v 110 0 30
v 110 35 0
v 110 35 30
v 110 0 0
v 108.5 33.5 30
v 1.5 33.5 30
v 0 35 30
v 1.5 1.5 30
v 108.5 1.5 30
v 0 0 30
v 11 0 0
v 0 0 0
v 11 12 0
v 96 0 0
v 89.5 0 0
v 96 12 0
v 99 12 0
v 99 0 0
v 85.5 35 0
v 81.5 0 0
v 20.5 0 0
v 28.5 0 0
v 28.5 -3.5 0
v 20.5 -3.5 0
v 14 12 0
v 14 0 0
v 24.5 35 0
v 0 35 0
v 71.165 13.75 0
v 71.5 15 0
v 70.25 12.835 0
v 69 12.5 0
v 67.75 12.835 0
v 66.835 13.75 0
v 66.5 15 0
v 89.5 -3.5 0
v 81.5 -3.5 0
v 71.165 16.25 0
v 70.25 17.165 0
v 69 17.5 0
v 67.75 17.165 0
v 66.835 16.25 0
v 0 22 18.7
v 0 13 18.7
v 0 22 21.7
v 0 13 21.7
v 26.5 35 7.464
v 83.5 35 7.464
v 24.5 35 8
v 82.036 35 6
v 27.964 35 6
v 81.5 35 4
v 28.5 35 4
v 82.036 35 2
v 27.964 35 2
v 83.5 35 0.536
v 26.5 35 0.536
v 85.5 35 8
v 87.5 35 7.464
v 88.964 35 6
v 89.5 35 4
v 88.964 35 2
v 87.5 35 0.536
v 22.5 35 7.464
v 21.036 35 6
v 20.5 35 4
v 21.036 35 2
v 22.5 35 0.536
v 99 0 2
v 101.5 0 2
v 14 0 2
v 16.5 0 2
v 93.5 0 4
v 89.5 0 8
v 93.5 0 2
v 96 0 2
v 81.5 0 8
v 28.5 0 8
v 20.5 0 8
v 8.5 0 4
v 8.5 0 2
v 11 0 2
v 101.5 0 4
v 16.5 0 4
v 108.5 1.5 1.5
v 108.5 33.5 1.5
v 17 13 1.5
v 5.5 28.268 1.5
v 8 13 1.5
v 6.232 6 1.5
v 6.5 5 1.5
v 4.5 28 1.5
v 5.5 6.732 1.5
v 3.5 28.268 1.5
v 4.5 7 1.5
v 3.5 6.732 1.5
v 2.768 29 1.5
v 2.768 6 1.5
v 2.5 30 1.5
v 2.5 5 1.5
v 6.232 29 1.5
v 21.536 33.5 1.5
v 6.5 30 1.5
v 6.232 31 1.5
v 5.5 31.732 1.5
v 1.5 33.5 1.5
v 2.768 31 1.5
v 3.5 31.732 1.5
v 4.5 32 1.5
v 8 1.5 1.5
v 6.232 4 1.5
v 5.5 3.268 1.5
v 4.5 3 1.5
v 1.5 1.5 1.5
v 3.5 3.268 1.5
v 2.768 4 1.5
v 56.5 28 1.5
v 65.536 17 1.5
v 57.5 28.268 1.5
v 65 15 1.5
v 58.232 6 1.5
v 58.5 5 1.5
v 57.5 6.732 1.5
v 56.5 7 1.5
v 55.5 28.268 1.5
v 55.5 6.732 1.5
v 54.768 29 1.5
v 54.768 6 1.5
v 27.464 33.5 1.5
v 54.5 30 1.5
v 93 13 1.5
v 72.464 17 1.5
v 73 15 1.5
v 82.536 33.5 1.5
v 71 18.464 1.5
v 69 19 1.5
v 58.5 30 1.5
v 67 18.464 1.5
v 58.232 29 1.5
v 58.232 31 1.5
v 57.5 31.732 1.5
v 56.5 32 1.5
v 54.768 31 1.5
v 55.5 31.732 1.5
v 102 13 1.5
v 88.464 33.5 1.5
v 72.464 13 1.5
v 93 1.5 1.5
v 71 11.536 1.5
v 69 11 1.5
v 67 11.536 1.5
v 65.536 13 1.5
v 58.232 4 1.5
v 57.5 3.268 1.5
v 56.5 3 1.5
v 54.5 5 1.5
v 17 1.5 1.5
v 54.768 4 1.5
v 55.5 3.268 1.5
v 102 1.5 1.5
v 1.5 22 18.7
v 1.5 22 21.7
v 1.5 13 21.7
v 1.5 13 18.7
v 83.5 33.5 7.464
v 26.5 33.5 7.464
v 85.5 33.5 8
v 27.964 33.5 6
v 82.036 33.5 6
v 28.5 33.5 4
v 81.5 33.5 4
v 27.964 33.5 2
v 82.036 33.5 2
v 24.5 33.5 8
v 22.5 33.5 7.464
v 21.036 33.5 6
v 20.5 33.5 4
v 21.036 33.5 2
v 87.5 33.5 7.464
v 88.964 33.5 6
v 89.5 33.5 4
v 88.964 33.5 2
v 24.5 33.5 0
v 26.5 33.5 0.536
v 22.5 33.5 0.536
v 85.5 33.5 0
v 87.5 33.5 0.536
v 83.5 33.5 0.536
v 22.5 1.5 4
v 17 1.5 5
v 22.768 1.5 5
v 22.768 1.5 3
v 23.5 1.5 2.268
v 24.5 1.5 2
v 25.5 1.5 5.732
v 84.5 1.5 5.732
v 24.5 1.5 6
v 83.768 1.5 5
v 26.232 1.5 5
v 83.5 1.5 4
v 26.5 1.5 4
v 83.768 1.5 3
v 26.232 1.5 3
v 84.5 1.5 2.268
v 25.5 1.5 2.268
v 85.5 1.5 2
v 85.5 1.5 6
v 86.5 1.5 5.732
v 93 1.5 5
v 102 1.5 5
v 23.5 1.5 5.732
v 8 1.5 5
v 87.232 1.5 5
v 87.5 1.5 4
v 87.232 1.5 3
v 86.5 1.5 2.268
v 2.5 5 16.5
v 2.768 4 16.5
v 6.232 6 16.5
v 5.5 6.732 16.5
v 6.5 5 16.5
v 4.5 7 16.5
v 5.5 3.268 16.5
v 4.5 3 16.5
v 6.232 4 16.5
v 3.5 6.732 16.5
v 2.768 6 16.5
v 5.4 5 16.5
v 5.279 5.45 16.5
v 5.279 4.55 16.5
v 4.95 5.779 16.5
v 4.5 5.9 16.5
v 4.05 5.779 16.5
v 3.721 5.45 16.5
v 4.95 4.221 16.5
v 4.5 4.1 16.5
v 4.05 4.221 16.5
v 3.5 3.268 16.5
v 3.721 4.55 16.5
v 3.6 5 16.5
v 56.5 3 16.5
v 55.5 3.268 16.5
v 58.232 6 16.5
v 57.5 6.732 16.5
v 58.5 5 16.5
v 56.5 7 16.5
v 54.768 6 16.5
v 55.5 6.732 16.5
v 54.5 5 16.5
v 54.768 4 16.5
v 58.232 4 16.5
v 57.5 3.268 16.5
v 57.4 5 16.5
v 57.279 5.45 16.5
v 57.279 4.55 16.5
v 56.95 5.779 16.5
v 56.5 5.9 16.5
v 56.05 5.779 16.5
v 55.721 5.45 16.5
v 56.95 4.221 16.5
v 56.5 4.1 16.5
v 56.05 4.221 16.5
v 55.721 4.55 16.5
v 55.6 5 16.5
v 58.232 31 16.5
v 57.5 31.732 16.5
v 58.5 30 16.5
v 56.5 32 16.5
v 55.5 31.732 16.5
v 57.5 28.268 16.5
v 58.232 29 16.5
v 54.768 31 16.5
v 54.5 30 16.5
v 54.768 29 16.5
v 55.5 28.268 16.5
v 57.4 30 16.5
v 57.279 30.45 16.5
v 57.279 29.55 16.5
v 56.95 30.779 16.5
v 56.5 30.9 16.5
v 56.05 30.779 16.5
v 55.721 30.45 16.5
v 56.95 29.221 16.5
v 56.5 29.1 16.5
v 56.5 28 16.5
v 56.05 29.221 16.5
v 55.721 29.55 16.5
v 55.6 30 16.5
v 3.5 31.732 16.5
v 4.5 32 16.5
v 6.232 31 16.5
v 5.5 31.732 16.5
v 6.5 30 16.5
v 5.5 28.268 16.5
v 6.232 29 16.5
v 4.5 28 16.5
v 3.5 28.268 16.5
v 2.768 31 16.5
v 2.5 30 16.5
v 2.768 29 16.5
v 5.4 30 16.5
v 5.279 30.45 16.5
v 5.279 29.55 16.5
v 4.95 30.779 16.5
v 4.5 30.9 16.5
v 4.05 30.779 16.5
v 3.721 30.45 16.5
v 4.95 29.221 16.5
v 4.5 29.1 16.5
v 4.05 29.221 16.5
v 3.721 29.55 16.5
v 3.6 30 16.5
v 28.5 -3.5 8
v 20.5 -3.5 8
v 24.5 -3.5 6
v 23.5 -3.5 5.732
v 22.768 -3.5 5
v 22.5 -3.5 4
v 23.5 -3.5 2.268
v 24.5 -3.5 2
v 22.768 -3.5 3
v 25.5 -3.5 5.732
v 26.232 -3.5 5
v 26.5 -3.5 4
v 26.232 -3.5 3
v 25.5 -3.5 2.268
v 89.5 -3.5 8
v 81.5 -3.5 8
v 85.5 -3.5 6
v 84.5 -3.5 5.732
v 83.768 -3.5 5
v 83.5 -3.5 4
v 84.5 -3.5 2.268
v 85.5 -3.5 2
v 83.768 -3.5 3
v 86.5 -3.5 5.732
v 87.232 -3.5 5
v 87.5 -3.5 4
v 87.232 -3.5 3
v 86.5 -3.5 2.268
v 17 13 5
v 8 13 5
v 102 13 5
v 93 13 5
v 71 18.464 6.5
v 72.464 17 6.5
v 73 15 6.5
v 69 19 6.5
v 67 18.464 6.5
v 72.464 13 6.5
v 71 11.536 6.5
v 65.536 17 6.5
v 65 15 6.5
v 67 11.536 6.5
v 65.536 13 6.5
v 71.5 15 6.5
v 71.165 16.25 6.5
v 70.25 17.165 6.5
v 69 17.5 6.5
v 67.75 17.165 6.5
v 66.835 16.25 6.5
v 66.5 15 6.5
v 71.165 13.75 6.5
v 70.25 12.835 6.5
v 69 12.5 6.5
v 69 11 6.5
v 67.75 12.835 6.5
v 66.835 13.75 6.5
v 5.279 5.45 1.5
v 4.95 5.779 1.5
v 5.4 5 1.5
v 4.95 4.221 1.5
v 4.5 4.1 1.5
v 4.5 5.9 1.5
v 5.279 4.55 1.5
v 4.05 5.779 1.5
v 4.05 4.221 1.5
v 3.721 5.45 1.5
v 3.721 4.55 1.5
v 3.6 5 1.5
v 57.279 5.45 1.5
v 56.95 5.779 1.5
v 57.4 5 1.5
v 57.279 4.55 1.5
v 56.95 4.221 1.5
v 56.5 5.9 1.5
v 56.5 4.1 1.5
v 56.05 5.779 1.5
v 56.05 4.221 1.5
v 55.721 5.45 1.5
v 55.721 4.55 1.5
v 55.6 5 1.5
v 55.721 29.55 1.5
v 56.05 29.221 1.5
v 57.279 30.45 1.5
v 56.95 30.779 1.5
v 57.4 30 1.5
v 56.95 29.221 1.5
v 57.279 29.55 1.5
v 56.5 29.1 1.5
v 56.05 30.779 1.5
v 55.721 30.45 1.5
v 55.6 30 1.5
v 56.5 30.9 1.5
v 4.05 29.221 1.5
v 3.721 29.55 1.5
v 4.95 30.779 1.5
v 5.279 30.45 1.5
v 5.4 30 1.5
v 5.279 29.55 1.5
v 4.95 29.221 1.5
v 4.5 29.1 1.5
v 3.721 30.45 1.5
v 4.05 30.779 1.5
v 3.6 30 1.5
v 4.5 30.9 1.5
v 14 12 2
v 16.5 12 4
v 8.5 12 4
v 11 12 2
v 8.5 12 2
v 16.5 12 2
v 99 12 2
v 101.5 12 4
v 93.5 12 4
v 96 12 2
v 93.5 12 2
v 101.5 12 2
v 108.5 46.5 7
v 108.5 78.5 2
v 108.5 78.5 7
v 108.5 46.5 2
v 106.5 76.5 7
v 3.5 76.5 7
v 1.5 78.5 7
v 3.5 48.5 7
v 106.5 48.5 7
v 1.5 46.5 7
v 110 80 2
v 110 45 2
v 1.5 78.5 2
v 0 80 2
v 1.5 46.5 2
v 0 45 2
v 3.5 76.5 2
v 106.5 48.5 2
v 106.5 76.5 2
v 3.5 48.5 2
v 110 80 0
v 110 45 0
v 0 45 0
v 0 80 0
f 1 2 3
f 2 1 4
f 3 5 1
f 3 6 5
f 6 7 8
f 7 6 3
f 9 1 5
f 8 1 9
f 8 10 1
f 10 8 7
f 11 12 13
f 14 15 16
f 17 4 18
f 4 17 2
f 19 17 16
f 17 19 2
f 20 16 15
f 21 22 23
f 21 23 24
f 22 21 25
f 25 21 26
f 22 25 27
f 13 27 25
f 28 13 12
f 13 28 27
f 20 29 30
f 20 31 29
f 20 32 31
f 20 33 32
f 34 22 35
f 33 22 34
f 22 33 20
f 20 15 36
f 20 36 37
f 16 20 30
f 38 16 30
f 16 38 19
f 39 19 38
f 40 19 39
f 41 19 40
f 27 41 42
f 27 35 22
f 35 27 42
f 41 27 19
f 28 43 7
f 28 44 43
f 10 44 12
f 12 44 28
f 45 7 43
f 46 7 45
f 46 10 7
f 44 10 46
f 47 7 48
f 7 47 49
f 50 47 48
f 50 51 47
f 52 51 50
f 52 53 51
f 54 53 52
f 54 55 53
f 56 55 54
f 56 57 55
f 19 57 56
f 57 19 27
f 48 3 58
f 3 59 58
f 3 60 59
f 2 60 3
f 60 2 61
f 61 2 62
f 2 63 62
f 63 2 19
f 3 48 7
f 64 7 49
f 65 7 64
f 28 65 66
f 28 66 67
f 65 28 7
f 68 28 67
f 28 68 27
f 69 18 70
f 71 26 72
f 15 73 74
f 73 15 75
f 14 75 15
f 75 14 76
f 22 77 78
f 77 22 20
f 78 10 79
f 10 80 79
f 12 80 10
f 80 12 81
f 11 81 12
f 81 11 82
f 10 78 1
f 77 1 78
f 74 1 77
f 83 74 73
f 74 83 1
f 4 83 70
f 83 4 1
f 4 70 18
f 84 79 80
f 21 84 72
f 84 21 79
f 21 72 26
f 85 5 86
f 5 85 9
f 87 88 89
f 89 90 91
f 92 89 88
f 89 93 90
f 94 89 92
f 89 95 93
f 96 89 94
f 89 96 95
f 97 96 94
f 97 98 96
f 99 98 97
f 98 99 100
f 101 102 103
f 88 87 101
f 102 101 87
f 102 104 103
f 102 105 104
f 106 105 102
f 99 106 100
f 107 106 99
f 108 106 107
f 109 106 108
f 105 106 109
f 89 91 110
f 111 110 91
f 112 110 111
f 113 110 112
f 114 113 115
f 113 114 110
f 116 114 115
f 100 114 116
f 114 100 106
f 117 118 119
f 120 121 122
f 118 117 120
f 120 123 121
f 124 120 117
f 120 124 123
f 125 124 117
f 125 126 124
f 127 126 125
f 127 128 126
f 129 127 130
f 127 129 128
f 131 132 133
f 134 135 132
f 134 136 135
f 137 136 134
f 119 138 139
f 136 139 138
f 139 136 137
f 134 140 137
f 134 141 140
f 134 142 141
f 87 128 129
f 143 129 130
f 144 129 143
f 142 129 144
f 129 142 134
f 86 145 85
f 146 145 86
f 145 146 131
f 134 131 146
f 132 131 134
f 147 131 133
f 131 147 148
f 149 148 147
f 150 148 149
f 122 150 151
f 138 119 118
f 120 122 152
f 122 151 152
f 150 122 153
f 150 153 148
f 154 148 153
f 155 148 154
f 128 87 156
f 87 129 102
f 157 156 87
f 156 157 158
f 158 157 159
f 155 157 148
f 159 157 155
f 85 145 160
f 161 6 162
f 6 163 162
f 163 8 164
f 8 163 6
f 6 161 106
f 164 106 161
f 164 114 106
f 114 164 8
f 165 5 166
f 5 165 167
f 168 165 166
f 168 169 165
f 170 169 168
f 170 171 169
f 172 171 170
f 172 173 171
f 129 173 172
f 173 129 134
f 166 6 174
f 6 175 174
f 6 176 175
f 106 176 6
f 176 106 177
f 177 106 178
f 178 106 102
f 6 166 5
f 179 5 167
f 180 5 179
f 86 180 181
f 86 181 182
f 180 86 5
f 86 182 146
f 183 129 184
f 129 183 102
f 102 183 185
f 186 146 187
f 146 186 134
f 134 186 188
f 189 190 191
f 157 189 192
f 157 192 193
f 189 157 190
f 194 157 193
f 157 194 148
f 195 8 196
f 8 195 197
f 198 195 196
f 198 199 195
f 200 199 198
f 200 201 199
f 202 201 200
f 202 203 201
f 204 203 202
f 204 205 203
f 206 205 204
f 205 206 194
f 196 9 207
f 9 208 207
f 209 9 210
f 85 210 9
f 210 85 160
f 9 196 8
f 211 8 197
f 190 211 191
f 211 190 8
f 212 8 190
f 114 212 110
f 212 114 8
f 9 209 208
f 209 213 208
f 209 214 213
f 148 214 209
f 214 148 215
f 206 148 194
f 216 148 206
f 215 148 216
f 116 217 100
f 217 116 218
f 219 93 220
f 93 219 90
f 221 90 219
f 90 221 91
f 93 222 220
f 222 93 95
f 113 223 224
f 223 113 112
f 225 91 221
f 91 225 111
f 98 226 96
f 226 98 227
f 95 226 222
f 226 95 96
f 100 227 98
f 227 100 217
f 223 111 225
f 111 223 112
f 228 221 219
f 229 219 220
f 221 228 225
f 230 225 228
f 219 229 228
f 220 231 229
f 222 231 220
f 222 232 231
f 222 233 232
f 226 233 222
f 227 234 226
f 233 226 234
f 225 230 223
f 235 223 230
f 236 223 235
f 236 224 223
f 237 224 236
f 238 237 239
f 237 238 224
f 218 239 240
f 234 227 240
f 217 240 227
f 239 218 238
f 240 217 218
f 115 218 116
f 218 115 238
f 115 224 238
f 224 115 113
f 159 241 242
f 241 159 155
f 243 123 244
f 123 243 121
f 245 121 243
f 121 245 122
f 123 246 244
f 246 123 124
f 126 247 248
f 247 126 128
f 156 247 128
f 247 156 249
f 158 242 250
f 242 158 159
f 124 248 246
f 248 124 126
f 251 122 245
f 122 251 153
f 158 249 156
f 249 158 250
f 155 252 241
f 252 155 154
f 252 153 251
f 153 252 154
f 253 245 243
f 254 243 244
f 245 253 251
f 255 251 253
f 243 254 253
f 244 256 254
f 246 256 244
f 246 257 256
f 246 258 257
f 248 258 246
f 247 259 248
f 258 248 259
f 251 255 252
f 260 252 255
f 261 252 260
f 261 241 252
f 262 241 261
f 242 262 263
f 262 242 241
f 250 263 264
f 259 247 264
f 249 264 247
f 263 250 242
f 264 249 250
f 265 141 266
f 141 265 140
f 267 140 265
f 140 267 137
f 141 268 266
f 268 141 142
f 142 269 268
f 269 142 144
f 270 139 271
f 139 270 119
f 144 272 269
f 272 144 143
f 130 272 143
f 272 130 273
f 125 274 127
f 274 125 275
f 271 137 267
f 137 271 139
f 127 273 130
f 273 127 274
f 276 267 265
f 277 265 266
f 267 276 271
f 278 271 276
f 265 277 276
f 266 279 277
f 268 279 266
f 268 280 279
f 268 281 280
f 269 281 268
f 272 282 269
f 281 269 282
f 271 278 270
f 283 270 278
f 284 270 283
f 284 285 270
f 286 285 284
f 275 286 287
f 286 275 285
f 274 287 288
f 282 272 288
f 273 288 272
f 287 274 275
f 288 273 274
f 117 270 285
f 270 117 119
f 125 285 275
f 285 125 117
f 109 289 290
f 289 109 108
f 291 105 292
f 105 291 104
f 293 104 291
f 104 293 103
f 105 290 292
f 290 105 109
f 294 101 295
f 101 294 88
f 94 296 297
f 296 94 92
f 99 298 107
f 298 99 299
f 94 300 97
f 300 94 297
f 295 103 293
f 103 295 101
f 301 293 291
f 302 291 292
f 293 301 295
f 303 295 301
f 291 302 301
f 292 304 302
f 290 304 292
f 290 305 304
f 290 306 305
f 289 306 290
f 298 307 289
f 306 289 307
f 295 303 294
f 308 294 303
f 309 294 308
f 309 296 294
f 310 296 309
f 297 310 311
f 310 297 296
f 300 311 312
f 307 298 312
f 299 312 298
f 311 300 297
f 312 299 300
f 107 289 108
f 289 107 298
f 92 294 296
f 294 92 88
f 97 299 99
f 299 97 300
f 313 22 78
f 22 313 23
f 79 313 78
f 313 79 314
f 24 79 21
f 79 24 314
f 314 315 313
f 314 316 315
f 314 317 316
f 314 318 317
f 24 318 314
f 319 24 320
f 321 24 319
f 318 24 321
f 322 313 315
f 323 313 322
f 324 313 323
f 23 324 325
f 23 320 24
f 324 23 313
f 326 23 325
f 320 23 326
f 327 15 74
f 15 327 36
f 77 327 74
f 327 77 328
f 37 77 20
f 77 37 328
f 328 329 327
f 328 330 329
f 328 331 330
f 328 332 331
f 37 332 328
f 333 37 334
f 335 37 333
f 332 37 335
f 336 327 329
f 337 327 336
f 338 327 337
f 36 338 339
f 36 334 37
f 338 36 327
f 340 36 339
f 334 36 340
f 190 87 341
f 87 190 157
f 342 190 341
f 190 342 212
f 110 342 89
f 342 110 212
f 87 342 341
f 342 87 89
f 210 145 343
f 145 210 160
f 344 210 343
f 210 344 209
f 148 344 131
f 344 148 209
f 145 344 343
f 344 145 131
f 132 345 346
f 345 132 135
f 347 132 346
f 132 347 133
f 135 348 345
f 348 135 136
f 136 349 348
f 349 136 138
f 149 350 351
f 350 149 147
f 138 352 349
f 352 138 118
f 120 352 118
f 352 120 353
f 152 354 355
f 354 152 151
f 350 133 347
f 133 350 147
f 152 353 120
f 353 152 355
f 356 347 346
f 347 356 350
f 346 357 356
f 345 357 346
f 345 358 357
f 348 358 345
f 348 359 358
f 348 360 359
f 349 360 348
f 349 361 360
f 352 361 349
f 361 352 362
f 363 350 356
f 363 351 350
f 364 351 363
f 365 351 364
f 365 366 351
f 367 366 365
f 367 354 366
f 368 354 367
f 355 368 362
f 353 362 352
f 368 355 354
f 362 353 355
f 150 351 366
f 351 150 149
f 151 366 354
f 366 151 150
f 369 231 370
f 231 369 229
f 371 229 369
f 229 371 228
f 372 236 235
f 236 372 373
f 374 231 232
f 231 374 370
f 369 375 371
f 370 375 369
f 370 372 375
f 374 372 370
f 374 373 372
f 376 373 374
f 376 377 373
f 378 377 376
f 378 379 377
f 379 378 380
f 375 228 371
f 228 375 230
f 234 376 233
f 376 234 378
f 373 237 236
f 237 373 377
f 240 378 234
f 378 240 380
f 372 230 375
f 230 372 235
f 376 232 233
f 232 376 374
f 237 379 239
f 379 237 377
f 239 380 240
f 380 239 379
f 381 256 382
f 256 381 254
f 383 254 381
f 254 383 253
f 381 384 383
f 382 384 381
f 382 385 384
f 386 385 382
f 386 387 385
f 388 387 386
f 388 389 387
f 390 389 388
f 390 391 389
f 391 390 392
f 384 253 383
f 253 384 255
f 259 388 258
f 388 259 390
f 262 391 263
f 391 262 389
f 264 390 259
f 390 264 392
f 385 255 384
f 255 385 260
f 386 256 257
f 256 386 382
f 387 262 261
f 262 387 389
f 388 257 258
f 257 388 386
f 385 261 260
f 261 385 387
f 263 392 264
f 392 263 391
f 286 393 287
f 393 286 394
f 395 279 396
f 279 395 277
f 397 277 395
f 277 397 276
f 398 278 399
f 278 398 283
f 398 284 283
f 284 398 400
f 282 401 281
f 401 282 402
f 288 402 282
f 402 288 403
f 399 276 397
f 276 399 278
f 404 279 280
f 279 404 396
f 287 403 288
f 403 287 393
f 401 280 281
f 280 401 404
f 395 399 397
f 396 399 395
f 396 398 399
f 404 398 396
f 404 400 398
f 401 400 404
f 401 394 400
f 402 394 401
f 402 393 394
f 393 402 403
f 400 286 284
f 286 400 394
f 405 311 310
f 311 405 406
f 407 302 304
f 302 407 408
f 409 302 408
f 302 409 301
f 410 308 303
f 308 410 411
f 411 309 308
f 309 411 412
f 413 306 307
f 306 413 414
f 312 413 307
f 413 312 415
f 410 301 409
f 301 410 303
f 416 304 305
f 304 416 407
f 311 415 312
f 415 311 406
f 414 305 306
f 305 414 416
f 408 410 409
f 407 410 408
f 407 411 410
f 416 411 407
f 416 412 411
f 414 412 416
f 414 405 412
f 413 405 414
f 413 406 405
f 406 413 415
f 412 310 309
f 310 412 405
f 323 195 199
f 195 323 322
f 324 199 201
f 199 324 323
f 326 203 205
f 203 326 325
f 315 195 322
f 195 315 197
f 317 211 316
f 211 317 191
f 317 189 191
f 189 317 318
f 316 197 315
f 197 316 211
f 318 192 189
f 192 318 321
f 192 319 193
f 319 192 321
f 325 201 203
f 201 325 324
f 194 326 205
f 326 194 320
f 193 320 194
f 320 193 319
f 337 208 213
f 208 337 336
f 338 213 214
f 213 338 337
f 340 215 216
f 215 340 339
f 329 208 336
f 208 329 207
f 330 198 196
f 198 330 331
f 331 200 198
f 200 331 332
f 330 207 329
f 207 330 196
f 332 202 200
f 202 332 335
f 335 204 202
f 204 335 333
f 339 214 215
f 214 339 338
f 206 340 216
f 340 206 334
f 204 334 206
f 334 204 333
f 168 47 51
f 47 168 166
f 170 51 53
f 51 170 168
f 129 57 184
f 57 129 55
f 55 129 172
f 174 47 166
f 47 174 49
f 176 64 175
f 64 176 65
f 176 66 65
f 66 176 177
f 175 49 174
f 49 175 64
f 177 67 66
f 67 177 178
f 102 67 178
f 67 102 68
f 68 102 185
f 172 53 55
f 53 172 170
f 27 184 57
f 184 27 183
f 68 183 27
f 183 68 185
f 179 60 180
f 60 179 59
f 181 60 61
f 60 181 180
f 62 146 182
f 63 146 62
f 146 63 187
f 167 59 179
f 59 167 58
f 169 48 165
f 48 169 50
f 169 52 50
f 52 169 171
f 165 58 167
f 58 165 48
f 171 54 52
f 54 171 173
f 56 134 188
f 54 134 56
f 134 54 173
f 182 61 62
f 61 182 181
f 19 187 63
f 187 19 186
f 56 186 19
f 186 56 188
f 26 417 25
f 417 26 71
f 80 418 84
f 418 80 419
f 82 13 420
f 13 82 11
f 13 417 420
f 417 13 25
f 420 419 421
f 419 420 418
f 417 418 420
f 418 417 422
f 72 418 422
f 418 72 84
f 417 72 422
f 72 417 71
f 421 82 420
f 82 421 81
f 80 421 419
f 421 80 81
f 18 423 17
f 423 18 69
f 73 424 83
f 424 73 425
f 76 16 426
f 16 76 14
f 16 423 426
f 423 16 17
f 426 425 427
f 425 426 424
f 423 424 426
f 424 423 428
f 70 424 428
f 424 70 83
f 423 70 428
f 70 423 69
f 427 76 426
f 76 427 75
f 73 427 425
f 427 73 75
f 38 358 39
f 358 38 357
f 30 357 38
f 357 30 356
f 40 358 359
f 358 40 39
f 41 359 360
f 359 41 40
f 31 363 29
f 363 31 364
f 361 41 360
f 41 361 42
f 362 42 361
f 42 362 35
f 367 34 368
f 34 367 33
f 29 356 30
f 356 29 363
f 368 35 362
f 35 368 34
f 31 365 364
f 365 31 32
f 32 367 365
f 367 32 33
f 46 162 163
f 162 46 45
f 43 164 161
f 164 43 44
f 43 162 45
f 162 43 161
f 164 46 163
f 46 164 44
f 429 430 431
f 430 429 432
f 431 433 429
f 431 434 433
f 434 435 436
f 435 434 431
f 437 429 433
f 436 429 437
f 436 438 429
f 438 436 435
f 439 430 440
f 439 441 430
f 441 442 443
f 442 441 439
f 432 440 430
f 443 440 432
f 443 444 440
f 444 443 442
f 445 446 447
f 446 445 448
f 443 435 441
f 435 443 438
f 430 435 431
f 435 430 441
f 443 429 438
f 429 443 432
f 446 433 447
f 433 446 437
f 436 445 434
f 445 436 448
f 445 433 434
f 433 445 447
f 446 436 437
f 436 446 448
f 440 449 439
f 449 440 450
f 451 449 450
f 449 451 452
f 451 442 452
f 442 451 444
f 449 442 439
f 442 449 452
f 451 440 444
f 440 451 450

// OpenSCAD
$casewidth=110;
$caseheight=30;
$casedepth=35;
$casewall=1.5;

$screwdistance=61;
$screwdiameter=4;
$screwblockdepth=3.5;
$screwblockwidth=8;
$screwopeningdiameter=8;

$irborex=69;
$irborey=15;
$irledborediameter=5;
$irledmountdiameter=8;
$irledheight=6.5;


$pcbboredistx=52;
$pcbboredisty=25;
$pcbborediameter=1.8;
$pcbmountdiameter=4;
$pcbmountheight=15;

/* Offset PCB -> Center Borehole x */
$pcbboreoffset_x_left=3;
/* The PCB should touch the wall */
$pcboffsetx=$casewall+$pcbboreoffset_x_left;


$slidedistance=85;
$slidebasewidth=3;
$slideheadwidth=8;
$slideheadheight=2;
$slideheight=4;
$slidedepth=12;

$slideblockwidth=$slideheadwidth+1;
$slideblockdepth=$slidedepth+1;
$slideblockheight=$slideheight+1;

$pcbthickness=2.2;
$musbz=$pcbmountheight+$pcbthickness;
$musbwidth=9;
$musbheight=3;

module case() {
  difference() {
     cube([$casewidth, $casedepth, $caseheight]);
     translate([$casewall, $casewall, $casewall]) {
       cube([$casewidth-2*$casewall, $casedepth-2*$casewall, $caseheight-$casewall]);
     }
  }
}

module irled(diameter) {
  translate([$irborex, $irborey, 0]) {
    cylinder(h=$irledheight, d=diameter, $fn=12);
  } 
}

module pcbmount(diameter) {
  translate([$pcboffsetx, $casedepth/2-$pcbboredisty/2, $casewall]) {
  union() {
      cylinder(h=$pcbmountheight, d=diameter, $fn=12);
      translate([$pcbboredistx, 0, 0]) {
        cylinder(h=$pcbmountheight, d=diameter, $fn=12);
      }
      translate([$pcbboredistx, $pcbboredisty, 0]) {
        cylinder(h=$pcbmountheight, d=diameter, $fn=12);
      }
      translate([0, $pcbboredisty, 0]) {
        cylinder(h=$pcbmountheight, d=diameter, $fn=12);
      }
    }
  }
}

module screwblock_block() {
    translate([-$screwblockwidth/2,-$screwblockdepth,0]) {
        cube([$screwblockwidth, $screwblockdepth, $screwblockwidth]);
    }
}

module screwblock_bore() {
    translate([0,$casewall,$screwblockwidth/2]) {
        rotate([90,0,0]) {
            cylinder(h=$screwblockdepth+$casewall, d=$screwdiameter, $fn=12);
        }
    }
}

module screwblock(bore) {
    if (bore) {
        screwblock_bore();
    } else {
        screwblock_block();
    }
}

module screwblocks(bore) {
    translate([$casewidth/2-$screwdistance/2,0,0]) {
        screwblock(bore);
    }
    translate([$casewidth/2+$screwdistance/2,0,0]) {
        screwblock(bore);
    }
}

module screwopenings() {
    translate([$casewidth/2-$screwdistance/2,$casedepth,$screwblockwidth/2]) {
        rotate([90,0,0]) {
            cylinder(h=$casewall, d=$screwopeningdiameter, $fn=12);
        }
    }
    translate([$casewidth/2+$screwdistance/2,$casedepth,$screwblockwidth/2]) {
        rotate([90,0,0]) {
            cylinder(h=$casewall, d=$screwopeningdiameter, $fn=12);
        }
    }
}

module slide() {
    union() {
        translate([-$slidebasewidth/2,0,0]) {
            cube([$slidebasewidth, $slidedepth, $slideheight]);
        }
        translate([-$slideheadwidth/2,0,$slideheight-$slideheadheight]) {
            cube([$slideheadwidth, $slidedepth, $slideheadheight]);
        }
    }
}

module slides() {
    translate([$casewidth/2-$slidedistance/2,0,0]) {
        slide();
    }
    translate([$casewidth/2+$slidedistance/2,0,0]) {
        slide();
    }
}

module slideblock() {
    translate([-$slideblockwidth/2,0,0]) {
        cube([$slideblockwidth, $slideblockdepth, $slideblockheight]);
    }
}

module slideblocks() {
    translate([$casewidth/2-$slidedistance/2,0,0]) {
        slideblock();
    }
    translate([$casewidth/2+$slidedistance/2,0,0]) {
        slideblock();
    }
}

module microusb() {
    translate([0,-$musbwidth/2,0]) {
        cube([$casewall, $musbwidth, $musbheight]);
    }
}

difference() {    
  union() {
    case();
    irled($irledmountdiameter);
    pcbmount($pcbmountdiameter);
    screwblocks(0);
    slideblocks();
  }
  irled($irledborediameter);
  pcbmount($pcbborediameter);
  screwblocks(1);
  screwopenings();
  slides();
  translate([0,$casedepth/2,$musbz+$casewall]) {
      microusb();
  }
}

$coverbasethickness=2;
$coverintake=5;
$coverintakewall=2;

translate([0,$casedepth+10,0]) {
    cube([$casewidth, $casedepth, $coverbasethickness]);
    translate([$casewall, $casewall, $coverbasethickness]) {
        difference() {
            cube([$casewidth-2*$casewall, $casedepth-2*$casewall, $coverintake]);
            translate([$coverintakewall, $coverintakewall, 0]) {
                cube([$casewidth-2*$casewall-$coverintakewall*2, $casedepth-2*$casewall-2*$coverintakewall, $coverintake]);
            }
        }
    }
}
